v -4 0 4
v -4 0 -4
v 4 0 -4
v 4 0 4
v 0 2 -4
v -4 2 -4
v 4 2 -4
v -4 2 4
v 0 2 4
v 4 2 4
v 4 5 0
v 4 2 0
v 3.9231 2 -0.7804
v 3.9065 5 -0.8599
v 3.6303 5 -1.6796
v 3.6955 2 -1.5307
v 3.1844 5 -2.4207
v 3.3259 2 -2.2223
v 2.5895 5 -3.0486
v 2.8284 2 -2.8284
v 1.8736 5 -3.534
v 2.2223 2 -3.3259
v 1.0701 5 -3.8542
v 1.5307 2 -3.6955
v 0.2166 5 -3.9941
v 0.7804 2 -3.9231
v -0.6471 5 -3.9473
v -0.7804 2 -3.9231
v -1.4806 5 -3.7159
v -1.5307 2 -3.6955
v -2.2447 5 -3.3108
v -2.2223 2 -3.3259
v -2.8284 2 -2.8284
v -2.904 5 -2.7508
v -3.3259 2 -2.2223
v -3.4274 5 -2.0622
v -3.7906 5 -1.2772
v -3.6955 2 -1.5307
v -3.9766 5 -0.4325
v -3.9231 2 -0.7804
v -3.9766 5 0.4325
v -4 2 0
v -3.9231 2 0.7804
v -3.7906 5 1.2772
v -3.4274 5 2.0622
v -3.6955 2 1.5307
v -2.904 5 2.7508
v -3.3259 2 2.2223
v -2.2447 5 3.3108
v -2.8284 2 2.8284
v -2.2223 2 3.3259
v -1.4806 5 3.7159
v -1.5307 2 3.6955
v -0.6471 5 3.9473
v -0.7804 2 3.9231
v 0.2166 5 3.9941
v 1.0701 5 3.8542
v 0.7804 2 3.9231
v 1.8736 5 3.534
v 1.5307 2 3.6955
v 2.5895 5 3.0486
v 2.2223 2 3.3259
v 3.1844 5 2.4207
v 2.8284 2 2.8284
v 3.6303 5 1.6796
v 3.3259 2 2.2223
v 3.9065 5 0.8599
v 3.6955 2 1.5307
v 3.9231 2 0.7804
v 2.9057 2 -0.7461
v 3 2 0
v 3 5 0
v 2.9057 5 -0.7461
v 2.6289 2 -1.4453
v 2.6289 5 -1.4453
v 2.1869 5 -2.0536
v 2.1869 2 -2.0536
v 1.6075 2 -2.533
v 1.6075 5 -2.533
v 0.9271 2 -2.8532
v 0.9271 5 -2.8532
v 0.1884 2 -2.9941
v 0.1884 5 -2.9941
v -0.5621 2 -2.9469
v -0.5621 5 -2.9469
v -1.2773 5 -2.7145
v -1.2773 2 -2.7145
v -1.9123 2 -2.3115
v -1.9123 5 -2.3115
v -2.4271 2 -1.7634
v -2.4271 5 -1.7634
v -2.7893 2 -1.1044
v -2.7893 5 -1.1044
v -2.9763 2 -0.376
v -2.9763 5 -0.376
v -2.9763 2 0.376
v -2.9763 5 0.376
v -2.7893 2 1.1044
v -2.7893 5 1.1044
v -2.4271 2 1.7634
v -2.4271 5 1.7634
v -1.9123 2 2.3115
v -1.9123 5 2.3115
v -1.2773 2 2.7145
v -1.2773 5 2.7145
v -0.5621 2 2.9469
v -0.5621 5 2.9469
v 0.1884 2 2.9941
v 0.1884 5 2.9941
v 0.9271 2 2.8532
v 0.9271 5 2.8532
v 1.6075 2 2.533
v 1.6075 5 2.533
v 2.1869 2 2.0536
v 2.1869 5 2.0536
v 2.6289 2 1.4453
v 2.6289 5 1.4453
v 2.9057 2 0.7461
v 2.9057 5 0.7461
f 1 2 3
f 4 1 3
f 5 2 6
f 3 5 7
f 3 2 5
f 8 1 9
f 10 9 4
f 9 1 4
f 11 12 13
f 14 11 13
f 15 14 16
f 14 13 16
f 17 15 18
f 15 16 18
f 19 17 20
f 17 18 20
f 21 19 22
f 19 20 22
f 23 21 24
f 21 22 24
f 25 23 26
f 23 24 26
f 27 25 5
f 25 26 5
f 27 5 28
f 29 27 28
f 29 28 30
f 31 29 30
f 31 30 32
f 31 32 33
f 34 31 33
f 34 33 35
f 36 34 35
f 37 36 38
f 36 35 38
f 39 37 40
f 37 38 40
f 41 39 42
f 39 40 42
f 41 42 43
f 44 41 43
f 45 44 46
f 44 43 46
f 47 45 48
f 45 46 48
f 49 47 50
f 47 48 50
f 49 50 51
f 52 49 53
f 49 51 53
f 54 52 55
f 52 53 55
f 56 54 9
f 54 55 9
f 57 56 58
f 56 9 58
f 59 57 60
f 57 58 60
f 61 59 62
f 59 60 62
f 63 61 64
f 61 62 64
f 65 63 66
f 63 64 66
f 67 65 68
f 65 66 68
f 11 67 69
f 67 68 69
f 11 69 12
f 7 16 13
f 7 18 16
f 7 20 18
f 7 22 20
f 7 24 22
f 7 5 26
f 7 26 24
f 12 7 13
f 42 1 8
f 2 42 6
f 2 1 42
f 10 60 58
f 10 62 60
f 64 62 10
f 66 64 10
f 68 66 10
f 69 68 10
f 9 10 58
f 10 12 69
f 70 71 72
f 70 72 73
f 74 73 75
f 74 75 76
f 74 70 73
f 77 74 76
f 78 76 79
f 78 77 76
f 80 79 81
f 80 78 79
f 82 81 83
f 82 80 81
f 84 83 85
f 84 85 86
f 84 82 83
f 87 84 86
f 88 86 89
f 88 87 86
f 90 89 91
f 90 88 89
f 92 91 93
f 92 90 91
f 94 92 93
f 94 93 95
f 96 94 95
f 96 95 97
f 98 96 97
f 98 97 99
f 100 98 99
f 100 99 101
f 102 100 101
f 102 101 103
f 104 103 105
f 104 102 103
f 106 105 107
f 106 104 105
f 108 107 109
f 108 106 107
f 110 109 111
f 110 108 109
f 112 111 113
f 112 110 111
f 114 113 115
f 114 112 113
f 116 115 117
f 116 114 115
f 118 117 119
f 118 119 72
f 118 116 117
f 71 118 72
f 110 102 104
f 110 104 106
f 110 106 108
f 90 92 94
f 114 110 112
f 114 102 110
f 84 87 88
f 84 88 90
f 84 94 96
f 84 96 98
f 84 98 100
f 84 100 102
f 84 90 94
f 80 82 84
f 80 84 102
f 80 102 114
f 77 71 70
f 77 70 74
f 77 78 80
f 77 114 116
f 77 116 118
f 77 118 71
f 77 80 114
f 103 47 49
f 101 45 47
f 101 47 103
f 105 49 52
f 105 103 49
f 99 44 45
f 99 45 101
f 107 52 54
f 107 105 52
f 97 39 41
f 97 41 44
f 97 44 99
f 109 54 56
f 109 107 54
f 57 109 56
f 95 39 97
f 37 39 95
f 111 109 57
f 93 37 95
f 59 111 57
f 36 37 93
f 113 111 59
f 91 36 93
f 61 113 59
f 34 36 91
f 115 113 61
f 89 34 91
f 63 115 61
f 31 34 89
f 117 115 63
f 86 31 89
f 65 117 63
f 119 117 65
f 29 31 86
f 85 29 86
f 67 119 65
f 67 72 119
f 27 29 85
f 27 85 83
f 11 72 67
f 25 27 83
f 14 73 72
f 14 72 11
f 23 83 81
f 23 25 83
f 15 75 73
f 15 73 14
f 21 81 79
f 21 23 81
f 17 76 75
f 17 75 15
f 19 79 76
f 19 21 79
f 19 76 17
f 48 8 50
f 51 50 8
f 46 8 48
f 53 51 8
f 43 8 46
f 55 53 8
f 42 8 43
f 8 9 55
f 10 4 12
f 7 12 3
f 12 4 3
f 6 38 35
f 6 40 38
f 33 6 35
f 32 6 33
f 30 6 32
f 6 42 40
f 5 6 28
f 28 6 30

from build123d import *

# Parameters (mm, degrees)
IZIM1_W                     = 8
IZIM1_H                     = 8
Y_KSEKLIK_EKSTR_ZYON1_DEPTH = 2
IZIM2_R                     = 4
IZIM2_R_2                   = 3
EKSTR_ZYON_NCE1_DEPTH       = 3


with BuildPart() as part:
    # Çizim1 → Yükseklik-Ekstrüzyon1 (new body)
    with BuildSketch(Plane(origin=(0, 0, 0), x_dir=(1, 0, 0), z_dir=(0, 1, 0))):
        Rectangle(IZIM1_W, IZIM1_H)
    extrude(amount=Y_KSEKLIK_EKSTR_ZYON1_DEPTH)

    # Çizim2 → Ekstrüzyon-İnce1 (add)
    with BuildSketch(Plane(origin=(0, 2, 0), x_dir=(1, 0, 0), z_dir=(0, 1, 0))):
        Circle(IZIM2_R)
        Circle(IZIM2_R_2, mode=Mode.SUBTRACT)
    extrude(amount=EKSTR_ZYON_NCE1_DEPTH)


solid = part.part
